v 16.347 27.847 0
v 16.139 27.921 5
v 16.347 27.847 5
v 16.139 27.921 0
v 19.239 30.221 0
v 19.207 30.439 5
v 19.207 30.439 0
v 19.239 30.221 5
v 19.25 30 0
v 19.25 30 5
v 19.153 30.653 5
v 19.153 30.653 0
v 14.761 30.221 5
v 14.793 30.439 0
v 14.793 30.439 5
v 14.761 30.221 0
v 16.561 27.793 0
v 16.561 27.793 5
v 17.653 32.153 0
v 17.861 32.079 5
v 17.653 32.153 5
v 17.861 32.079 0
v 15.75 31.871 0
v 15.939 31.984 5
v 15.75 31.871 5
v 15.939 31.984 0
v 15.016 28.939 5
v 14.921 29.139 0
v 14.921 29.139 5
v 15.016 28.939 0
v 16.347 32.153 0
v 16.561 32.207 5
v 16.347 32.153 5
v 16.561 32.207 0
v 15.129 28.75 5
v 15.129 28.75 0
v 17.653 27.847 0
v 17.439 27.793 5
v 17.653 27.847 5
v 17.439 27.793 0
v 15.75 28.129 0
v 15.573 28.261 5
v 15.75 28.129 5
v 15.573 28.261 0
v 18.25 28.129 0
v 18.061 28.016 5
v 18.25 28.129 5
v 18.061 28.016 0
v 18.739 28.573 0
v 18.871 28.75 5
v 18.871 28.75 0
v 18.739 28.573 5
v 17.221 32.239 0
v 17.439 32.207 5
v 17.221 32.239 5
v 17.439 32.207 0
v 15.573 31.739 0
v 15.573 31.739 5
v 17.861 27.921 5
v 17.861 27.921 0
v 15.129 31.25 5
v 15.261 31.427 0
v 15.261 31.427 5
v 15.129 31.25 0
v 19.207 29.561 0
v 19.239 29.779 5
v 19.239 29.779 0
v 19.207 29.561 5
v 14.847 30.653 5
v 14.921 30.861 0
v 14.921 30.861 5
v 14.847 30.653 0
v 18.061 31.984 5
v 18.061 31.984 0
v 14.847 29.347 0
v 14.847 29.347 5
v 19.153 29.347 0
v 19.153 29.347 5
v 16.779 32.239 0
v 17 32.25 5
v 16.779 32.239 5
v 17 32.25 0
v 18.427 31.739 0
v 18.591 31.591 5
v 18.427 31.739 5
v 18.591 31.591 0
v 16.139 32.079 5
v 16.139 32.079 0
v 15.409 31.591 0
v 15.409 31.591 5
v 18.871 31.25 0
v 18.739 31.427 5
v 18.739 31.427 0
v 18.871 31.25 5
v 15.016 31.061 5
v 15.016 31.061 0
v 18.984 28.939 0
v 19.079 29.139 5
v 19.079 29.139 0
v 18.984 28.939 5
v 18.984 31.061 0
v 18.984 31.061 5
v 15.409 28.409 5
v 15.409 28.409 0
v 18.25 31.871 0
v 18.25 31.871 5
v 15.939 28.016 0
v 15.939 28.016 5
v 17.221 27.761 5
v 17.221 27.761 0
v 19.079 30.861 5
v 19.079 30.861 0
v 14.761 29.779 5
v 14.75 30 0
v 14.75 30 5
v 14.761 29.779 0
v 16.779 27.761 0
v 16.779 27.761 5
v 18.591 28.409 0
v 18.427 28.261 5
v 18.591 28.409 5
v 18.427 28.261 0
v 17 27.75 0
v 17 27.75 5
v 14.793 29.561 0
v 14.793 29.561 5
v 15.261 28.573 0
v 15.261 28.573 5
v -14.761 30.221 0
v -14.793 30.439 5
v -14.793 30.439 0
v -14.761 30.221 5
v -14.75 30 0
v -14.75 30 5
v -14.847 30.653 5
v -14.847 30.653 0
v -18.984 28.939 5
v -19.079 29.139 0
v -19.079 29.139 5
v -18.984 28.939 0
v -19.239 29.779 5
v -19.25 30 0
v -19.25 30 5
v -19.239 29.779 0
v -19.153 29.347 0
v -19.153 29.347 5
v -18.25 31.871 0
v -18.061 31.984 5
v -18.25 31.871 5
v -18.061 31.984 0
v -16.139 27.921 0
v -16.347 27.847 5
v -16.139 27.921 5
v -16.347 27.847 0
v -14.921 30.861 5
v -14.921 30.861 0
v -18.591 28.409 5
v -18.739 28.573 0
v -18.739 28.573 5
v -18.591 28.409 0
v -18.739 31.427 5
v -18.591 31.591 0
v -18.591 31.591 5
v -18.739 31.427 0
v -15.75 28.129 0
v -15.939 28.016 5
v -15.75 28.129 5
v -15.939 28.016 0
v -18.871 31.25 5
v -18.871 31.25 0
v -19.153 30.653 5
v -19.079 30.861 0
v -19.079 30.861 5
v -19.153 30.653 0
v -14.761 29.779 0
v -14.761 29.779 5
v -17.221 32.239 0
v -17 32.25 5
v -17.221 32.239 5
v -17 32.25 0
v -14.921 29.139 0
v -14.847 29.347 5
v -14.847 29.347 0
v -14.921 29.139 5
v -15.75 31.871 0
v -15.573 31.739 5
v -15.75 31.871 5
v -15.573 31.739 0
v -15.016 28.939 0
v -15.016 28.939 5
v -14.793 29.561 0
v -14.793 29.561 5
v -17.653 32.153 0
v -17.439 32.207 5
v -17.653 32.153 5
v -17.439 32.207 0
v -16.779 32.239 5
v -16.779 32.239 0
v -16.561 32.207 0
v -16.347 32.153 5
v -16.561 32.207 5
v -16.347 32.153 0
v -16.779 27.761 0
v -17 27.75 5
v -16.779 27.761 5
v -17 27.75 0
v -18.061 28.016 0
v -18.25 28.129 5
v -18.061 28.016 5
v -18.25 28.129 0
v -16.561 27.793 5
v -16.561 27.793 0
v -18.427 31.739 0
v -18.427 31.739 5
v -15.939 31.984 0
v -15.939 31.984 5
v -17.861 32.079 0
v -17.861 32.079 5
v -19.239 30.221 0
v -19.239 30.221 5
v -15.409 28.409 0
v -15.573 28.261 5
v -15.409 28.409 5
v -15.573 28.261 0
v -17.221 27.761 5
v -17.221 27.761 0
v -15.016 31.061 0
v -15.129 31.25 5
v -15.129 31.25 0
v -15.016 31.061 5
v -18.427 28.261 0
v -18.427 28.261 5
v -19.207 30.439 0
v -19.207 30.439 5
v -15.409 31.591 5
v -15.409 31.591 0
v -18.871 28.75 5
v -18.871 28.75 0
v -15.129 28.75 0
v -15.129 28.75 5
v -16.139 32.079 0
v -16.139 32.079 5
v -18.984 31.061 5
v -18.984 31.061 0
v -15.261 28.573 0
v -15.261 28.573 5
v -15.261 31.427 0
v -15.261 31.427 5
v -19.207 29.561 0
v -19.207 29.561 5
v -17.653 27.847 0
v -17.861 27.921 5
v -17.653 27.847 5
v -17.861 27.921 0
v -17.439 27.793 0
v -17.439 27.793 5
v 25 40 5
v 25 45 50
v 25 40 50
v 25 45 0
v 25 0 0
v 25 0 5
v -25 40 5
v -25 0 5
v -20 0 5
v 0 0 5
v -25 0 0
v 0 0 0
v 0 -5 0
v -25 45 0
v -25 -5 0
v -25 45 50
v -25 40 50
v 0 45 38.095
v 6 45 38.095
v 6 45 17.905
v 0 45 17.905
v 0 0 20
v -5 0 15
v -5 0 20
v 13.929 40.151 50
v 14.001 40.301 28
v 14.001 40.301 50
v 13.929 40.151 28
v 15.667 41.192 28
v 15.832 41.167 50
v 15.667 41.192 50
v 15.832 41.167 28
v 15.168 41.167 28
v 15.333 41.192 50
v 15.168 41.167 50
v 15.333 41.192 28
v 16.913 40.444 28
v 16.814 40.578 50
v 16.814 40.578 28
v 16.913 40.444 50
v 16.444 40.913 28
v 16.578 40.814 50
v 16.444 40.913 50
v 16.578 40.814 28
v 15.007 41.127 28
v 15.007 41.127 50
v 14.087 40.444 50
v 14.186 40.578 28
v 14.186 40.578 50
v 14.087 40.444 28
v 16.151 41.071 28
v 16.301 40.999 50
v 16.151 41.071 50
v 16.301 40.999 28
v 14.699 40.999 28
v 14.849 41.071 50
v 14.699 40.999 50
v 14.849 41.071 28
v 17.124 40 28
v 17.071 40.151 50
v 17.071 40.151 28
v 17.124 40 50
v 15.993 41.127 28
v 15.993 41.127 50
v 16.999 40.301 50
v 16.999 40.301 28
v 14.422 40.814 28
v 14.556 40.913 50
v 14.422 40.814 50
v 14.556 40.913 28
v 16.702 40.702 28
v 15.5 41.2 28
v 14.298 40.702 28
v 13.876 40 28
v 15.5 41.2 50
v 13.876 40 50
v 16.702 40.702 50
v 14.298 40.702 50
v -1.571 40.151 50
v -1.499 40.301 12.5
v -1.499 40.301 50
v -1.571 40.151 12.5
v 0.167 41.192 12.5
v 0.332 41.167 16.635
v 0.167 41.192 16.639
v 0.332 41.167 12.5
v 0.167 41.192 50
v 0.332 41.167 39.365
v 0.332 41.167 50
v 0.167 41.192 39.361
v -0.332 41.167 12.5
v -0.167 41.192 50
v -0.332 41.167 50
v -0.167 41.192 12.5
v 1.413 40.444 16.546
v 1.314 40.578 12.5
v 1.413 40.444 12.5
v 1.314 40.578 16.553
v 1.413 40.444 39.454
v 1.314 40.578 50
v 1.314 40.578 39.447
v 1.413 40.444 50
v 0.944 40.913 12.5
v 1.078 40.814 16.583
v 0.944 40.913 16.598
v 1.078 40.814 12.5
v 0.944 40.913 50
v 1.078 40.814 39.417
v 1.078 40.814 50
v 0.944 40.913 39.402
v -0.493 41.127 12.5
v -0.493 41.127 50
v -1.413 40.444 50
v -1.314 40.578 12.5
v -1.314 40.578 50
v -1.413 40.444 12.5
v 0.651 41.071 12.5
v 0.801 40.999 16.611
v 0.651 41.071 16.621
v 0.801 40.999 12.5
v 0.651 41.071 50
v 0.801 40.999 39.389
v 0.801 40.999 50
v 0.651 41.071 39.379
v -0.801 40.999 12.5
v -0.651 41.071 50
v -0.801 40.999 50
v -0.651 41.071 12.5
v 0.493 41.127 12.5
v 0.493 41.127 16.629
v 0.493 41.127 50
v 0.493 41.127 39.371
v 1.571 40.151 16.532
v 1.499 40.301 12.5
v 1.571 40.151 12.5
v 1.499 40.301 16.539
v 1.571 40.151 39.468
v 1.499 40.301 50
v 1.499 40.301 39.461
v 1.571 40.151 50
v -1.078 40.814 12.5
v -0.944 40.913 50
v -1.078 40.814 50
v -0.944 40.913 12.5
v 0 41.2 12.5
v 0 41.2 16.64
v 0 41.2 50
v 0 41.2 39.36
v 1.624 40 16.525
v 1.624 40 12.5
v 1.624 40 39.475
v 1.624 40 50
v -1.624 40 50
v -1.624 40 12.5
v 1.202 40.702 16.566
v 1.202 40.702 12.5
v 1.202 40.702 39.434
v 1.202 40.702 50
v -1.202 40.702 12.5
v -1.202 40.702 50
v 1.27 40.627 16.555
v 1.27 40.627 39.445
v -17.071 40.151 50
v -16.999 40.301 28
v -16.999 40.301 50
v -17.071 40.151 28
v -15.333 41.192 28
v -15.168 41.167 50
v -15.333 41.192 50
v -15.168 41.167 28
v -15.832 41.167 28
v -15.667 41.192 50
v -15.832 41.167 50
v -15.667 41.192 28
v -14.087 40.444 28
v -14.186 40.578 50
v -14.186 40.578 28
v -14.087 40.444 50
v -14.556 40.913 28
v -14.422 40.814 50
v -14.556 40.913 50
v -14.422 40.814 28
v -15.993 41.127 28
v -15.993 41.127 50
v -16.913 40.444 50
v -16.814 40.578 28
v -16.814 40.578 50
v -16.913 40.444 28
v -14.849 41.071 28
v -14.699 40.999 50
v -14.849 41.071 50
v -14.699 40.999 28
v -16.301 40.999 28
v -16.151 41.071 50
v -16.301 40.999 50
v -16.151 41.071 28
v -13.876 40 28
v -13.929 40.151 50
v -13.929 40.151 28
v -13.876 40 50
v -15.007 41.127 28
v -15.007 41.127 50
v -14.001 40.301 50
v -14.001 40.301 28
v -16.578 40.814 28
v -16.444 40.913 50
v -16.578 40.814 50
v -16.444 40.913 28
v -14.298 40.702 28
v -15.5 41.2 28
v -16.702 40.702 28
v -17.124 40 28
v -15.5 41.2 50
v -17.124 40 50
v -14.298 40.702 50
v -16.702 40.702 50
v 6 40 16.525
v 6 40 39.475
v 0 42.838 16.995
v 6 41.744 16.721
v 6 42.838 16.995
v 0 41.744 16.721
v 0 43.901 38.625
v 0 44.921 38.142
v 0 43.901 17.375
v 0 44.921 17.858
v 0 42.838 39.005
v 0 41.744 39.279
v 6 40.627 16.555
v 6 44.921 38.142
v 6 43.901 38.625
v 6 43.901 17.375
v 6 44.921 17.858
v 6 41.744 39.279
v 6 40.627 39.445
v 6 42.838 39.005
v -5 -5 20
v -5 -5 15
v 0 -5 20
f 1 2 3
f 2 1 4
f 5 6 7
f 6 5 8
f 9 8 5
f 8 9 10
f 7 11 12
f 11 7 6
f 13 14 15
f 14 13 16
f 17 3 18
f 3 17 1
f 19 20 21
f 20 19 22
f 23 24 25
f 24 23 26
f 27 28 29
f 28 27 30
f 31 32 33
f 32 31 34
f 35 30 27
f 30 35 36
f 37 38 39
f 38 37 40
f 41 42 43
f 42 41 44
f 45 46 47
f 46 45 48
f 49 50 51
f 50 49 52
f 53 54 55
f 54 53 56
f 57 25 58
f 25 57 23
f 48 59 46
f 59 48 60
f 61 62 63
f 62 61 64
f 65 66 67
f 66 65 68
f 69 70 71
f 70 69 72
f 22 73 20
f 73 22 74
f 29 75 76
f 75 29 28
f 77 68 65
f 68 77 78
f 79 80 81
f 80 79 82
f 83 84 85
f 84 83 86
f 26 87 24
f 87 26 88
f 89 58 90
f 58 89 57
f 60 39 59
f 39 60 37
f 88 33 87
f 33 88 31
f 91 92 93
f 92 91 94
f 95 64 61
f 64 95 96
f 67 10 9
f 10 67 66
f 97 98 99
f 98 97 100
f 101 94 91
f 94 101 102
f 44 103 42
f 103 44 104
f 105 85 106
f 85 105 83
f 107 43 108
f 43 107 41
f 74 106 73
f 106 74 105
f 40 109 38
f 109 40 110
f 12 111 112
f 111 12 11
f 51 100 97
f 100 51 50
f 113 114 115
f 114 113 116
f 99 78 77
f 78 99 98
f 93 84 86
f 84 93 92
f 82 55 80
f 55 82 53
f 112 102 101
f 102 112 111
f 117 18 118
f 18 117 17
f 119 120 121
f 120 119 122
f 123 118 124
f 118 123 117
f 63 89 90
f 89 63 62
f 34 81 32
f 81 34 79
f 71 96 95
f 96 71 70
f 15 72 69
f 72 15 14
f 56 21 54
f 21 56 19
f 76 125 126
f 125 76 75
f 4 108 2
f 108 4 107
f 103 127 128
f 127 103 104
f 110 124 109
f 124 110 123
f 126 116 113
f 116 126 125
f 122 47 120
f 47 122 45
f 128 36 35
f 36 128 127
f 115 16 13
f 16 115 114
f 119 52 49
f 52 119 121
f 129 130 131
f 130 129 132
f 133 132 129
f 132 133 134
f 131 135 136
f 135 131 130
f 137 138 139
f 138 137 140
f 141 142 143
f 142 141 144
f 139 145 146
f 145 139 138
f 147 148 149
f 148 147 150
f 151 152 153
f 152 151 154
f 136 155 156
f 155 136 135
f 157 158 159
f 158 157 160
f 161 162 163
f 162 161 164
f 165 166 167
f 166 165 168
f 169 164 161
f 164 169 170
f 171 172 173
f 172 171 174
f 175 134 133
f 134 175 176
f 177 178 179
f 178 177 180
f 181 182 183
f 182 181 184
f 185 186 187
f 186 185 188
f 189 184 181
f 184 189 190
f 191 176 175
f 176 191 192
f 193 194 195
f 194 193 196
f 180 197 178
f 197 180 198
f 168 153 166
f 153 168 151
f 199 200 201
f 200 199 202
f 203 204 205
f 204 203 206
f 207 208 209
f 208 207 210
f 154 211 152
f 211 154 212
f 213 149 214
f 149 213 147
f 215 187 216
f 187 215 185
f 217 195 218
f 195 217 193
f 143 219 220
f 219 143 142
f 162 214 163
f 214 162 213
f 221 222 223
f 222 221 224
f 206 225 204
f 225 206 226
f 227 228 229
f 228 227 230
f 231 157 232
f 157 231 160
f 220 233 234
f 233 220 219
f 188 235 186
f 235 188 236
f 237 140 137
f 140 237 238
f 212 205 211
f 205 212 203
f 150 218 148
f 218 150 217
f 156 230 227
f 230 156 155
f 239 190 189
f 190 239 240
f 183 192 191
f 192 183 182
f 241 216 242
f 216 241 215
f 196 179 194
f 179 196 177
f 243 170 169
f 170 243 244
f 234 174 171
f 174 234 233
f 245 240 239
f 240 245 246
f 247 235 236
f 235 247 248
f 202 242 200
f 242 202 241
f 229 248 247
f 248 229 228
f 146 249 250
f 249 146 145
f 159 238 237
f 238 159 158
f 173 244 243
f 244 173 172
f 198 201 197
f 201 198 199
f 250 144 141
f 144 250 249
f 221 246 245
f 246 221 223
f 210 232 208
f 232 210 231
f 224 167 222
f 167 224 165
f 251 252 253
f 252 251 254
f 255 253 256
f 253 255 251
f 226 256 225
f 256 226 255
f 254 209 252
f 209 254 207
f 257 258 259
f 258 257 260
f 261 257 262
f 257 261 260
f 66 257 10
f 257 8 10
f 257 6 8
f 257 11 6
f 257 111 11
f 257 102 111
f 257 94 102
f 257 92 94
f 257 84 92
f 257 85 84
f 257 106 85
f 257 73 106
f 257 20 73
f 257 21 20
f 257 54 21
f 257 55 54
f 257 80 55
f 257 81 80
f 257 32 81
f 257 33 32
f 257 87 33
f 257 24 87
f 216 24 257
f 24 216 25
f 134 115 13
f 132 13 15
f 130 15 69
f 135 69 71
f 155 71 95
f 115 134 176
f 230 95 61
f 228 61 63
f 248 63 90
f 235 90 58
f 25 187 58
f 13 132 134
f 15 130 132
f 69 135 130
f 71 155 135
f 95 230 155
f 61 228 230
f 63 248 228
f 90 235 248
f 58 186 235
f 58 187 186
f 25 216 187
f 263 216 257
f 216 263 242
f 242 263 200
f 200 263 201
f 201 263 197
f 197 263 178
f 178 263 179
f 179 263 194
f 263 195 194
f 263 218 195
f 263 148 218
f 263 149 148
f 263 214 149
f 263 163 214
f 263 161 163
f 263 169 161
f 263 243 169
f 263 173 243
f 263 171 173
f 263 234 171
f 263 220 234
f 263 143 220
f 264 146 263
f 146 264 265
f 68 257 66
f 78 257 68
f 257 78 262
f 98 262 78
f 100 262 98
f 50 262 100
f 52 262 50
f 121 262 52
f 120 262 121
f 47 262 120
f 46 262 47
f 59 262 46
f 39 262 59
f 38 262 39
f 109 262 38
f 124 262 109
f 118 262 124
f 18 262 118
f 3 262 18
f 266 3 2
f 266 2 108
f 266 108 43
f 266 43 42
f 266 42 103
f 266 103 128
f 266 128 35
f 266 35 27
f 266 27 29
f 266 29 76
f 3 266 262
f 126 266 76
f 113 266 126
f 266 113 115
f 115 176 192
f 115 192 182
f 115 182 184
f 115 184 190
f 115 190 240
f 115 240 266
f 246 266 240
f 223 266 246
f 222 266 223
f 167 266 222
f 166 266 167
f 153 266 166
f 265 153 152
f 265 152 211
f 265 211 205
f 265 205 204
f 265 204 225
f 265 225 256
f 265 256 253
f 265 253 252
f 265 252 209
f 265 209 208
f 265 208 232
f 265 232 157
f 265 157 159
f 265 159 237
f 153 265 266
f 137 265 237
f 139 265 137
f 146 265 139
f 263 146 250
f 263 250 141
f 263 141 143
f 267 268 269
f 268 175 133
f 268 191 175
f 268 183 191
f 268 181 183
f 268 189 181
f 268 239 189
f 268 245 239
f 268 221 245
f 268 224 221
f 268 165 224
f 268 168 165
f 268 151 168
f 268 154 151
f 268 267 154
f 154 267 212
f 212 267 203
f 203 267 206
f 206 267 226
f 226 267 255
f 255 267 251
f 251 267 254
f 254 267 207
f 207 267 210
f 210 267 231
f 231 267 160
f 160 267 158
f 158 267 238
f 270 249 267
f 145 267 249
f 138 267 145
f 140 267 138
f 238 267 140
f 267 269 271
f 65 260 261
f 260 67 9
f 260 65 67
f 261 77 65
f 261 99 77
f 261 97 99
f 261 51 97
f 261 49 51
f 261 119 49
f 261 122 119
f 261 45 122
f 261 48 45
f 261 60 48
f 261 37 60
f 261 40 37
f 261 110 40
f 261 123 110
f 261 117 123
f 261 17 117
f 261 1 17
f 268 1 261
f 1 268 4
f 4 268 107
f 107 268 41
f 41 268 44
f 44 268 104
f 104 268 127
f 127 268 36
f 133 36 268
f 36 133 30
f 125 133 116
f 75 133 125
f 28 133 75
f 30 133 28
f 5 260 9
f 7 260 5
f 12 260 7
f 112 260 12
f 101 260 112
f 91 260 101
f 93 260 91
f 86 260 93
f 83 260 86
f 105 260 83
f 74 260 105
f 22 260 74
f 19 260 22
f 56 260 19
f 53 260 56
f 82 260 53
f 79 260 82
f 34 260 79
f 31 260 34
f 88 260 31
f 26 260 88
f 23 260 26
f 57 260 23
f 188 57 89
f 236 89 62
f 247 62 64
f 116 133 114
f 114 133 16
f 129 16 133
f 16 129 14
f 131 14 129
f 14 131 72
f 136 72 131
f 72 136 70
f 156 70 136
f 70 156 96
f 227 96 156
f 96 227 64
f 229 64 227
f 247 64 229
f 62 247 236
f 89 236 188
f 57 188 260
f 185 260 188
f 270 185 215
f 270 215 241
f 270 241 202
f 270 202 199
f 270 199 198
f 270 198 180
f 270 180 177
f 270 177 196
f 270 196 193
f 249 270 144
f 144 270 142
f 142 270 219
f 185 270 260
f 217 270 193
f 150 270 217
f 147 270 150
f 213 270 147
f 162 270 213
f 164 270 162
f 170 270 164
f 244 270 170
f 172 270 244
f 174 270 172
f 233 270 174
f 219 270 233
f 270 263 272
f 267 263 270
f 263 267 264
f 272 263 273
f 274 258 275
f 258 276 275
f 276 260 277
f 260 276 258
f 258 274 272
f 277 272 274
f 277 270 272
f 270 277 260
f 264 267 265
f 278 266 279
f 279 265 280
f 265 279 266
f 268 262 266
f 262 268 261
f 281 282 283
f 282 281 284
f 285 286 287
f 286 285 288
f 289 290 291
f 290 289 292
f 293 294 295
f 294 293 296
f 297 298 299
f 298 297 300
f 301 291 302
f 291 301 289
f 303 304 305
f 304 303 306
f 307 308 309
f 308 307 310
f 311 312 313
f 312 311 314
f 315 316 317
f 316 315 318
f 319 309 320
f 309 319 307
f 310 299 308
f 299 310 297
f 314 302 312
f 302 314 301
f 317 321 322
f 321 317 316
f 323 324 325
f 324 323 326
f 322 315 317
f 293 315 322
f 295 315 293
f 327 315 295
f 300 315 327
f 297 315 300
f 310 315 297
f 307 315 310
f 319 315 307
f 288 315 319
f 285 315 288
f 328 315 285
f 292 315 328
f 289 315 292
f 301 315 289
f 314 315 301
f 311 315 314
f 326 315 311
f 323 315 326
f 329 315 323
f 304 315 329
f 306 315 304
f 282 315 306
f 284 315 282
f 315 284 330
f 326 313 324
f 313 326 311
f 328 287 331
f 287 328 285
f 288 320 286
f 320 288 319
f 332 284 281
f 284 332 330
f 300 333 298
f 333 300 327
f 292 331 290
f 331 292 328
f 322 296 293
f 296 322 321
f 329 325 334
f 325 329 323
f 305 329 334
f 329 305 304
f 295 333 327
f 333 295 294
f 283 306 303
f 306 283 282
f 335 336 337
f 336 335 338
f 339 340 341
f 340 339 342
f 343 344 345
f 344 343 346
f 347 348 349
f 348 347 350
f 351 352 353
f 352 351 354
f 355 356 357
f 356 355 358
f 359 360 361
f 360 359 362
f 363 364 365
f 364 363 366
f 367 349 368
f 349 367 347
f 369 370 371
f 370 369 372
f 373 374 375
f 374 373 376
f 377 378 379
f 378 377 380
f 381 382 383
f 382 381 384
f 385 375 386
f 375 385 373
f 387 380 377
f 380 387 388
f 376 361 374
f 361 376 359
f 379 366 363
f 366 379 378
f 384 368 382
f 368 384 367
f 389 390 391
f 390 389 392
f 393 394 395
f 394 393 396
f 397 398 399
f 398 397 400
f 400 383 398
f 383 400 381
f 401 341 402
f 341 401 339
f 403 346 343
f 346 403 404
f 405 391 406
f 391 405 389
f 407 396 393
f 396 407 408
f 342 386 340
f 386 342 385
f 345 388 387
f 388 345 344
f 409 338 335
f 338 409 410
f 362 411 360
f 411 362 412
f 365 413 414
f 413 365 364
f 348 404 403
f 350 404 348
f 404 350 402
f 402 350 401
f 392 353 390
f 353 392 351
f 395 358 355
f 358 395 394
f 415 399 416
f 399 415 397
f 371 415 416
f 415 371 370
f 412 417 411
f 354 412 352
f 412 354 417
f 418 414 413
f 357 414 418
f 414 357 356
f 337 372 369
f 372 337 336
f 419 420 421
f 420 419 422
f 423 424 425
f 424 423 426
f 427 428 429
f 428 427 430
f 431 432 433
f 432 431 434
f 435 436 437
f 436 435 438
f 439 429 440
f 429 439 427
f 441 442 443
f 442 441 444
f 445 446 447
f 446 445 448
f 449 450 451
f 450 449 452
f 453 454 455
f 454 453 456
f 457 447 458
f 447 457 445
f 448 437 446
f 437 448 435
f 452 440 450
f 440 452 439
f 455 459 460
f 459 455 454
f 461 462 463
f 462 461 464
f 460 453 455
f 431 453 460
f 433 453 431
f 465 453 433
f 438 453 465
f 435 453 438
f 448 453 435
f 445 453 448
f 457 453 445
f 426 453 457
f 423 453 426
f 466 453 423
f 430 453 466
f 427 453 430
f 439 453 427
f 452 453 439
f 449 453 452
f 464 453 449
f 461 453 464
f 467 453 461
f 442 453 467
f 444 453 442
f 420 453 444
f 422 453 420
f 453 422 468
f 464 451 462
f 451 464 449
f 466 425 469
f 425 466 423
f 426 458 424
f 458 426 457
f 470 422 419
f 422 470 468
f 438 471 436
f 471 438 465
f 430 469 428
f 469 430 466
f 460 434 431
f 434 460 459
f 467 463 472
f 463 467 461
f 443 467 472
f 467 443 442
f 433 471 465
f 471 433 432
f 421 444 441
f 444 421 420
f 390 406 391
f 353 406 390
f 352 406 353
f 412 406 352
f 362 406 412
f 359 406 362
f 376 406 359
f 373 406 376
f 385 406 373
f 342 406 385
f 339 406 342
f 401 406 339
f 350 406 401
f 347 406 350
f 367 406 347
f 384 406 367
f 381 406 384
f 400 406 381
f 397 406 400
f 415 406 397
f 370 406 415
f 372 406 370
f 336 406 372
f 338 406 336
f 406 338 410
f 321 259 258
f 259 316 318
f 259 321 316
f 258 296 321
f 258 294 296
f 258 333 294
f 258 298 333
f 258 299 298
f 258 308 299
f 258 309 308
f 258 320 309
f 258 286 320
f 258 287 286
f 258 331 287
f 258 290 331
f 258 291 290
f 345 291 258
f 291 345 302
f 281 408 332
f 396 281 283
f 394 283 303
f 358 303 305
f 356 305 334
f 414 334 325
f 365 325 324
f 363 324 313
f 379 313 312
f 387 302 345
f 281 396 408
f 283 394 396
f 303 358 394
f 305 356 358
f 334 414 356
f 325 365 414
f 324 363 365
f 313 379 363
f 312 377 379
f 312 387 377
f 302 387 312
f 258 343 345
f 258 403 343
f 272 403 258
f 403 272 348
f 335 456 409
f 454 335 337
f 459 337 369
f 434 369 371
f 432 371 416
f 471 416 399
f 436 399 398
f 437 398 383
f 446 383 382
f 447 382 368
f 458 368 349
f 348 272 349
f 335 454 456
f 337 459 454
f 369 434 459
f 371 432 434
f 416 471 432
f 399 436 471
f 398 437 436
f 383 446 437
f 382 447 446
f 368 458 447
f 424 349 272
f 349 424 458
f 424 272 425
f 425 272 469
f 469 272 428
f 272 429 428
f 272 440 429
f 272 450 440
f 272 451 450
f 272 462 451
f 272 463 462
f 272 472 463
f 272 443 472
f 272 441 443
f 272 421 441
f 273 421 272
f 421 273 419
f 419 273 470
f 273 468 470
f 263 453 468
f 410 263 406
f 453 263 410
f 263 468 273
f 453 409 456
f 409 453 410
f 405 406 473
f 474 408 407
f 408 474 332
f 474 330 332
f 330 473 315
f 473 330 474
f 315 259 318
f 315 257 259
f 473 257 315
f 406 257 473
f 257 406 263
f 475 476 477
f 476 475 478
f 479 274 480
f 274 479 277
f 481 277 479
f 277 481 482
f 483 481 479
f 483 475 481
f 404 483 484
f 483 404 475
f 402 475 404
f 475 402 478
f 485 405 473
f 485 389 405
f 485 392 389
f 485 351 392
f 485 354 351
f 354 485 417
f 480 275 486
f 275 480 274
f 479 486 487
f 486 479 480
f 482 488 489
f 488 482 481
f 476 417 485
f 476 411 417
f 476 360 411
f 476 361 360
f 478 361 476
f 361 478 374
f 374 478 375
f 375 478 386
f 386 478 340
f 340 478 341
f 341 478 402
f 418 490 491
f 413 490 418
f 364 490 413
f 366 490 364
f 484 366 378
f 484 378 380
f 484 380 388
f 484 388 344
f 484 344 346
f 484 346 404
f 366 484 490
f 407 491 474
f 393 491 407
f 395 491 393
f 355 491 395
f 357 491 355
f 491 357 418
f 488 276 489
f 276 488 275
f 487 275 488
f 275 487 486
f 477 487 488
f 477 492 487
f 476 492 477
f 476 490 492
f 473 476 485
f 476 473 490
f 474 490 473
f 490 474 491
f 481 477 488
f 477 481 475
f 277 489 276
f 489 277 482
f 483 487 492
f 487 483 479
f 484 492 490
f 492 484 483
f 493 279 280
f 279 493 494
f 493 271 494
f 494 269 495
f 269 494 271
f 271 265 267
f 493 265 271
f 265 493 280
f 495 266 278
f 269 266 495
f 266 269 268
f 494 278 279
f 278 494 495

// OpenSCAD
// L-shaped mounting bracket for NEMA 17 stepper motor
// Print orientation: base plate on bed (z = 0), motor plate builds upward (+Z)

$fn = 64;

// ---------------- Dimensions (mm) ----------------
base_x0      = -25;   // base plate X start
base_x1      = 25;    // base plate X end
base_y0      = 0;     // base plate Y start
base_y1      = 45;    // base plate Y end
base_z       = 5;     // base plate Z thickness

motor_x0     = -25;   // motor plate X start
motor_x1     = 25;    // motor plate X end
motor_y      = 5;     // motor plate Y thickness (sits on base back edge)
motor_z      = 50;    // motor plate Z height

hole_m4_x    = -17;   // M4 holes X position (+/-)
hole_m4_y    = 30;    // M4 holes Y position
hole_m4_r    = 2.25;  // M4 hole radius

boss_d       = 23;    // motor centring boss hole diameter
boss_x       = 0;     // boss hole X centre
boss_z       = 28;    // boss hole Z centre

screw_d      = 3.4;   // M3 screw hole diameter
screw_n      = 4;     // screw holes count
screw_p      = 31;    // square pattern side length

gusset_t     = 5;     // gusset thickness (X)
gusset_w     = 20;    // gusset leg along Y
gusset_h     = 20;    // gusset leg along Z
gusset_x0    = -25;   // gusset X start (left and right edges)
gusset_x1    = -20;   // gusset X end (left side)

eps          = 0.5;   // cutter overshoot

// ---------------- Model ----------------
union() {
    // Base plate with M4 through-holes
    difference() {
        translate([base_x0, base_y0, 0])
            cube([base_x1 - base_x0, base_y1 - base_y0, base_z]);
        for (sx = [-1, 1])
            translate([sx * hole_m4_x, hole_m4_y, -eps])
                cylinder(r = hole_m4_r, h = base_z + 2 * eps);
    }

    // Motor plate standing on the back edge of the base
    difference() {
        translate([motor_x0, base_y1 - motor_y, 0])
            cube([motor_x1 - motor_x0, motor_y, motor_z]);
        // Boss hole (along Y), centred at x = 0, z = 28
        translate([boss_x, base_y1 - motor_y - eps, boss_z])
            rotate([0, 90, 0])
                cylinder(d = boss_d, h = motor_y + 2 * eps);
        // Four M3 screw holes on a 31 mm square pattern
        for (a = [0, 90, 180, 270])
            translate([boss_x + screw_p / 2 * cos(a),
                       base_y1 - motor_y - eps,
                       boss_z + screw_p / 2 * sin(a)])
                cylinder(d = screw_d, h = motor_z + 2 * eps);
    }

    // Triangular gussets, flush with left and right edges
    // Right-angle corner at y = 5, z = 5; extruded along X
    for (gx = [gusset_x0, gusset_x1]) {
        translate([gx, 0, 0])
            rotate([90, 0, 0])
                linear_extrude(height = gusset_t)
                    polygon(points = [
                        [0, 0],
                        [gusset_w, 0],
                        [gusset_w, gusset_h]
                    ]);
    }
}
